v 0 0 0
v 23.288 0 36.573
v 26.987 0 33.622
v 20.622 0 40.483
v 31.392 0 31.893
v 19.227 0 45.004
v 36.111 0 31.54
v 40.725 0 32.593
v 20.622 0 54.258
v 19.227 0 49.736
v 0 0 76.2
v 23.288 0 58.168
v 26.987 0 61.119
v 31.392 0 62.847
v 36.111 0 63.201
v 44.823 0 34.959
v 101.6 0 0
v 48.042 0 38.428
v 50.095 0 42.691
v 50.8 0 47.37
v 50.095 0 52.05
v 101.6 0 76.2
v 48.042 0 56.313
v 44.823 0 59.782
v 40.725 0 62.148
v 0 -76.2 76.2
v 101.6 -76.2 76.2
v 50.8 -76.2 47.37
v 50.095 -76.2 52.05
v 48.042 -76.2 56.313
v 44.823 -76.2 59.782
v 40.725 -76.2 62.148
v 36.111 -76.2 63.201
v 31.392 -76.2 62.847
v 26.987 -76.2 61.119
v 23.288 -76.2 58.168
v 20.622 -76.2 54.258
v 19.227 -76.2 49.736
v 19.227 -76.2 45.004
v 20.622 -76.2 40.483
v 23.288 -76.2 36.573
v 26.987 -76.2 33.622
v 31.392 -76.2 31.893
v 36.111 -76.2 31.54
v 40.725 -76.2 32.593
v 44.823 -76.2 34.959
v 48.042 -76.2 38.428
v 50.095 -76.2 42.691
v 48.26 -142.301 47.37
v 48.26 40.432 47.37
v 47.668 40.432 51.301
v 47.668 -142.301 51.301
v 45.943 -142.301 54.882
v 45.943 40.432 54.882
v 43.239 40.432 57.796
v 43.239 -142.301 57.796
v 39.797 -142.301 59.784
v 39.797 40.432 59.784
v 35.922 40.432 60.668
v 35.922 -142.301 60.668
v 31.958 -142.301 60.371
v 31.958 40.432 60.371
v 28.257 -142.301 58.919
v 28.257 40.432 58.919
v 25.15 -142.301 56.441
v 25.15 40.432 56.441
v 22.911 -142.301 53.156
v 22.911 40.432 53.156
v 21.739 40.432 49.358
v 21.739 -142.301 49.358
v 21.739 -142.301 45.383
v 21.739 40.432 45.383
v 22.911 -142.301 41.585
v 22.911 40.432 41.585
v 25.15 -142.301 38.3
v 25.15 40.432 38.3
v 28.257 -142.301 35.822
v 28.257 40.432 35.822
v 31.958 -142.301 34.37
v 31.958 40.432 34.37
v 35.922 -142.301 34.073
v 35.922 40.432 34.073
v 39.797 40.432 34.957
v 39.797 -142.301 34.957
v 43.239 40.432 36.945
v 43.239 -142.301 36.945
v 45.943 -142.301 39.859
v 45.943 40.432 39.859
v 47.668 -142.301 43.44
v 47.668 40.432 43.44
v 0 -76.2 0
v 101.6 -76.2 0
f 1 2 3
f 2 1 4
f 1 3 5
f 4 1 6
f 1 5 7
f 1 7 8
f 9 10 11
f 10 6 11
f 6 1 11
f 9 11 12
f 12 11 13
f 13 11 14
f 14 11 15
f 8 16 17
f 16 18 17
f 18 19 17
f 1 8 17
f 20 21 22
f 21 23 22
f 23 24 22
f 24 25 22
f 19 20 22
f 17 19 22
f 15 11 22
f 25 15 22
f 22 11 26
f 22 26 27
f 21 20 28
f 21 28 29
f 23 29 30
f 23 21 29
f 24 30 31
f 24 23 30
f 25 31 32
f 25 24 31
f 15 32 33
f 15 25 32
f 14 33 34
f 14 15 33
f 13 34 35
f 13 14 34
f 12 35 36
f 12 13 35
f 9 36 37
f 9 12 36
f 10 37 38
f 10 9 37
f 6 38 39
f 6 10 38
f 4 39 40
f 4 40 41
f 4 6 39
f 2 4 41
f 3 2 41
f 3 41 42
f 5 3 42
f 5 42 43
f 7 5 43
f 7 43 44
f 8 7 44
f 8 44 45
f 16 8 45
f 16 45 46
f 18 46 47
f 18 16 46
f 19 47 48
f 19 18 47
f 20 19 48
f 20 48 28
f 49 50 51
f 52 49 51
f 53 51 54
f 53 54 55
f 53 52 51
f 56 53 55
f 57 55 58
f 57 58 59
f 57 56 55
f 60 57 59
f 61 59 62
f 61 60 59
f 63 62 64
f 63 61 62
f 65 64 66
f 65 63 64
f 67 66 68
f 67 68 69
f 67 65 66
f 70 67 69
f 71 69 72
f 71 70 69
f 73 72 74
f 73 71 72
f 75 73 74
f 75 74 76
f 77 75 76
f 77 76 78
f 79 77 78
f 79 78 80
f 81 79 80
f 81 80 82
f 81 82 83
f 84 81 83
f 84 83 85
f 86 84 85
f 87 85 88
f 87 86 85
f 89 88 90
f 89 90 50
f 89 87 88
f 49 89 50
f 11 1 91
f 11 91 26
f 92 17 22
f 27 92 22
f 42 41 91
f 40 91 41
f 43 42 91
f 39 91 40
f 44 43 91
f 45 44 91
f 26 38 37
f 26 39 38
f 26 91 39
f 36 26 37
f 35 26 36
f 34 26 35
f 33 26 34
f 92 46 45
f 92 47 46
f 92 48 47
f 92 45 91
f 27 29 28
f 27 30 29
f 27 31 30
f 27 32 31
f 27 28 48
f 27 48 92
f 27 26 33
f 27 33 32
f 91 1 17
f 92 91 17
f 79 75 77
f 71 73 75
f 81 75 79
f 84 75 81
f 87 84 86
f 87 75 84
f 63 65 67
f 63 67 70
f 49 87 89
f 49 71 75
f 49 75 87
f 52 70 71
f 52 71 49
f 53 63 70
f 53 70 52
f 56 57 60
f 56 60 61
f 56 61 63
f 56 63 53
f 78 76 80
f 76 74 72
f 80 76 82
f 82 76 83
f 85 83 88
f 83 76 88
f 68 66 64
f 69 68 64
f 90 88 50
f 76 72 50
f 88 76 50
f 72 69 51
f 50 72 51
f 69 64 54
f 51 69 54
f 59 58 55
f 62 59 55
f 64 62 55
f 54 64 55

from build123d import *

# Parameters (mm, degrees)
F0_W          = 101.6
F0_H          = 76.2
F0_R          = 15.875
F1_DEPTH      = 76.2
F2_R          = 13.335
F3_DEPTH      = 66.10109
F3_DEPTH_BACK = 116.63167


with BuildPart() as f1:
    # F0 (on Front) → F1 (new body)
    with BuildSketch(Plane.XZ):
        with Locations((50.8, 38.1)):
            Rectangle(F0_W, F0_H)
        with Locations((34.925, 47.370449)):
            Circle(F0_R, mode=Mode.SUBTRACT)
    extrude(amount=F1_DEPTH)


with BuildPart() as f3:
    # F2 (on face) → F3 (new body, two sides)
    with BuildSketch(Plane.XZ.offset(76.2)) as f3_sk:
        with Locations((34.925, 47.370449)):
            Circle(F2_R)
    extrude(amount=F3_DEPTH)
    extrude(f3_sk.sketch, amount=-F3_DEPTH_BACK)


solid = Compound([f1.part, f3.part])
